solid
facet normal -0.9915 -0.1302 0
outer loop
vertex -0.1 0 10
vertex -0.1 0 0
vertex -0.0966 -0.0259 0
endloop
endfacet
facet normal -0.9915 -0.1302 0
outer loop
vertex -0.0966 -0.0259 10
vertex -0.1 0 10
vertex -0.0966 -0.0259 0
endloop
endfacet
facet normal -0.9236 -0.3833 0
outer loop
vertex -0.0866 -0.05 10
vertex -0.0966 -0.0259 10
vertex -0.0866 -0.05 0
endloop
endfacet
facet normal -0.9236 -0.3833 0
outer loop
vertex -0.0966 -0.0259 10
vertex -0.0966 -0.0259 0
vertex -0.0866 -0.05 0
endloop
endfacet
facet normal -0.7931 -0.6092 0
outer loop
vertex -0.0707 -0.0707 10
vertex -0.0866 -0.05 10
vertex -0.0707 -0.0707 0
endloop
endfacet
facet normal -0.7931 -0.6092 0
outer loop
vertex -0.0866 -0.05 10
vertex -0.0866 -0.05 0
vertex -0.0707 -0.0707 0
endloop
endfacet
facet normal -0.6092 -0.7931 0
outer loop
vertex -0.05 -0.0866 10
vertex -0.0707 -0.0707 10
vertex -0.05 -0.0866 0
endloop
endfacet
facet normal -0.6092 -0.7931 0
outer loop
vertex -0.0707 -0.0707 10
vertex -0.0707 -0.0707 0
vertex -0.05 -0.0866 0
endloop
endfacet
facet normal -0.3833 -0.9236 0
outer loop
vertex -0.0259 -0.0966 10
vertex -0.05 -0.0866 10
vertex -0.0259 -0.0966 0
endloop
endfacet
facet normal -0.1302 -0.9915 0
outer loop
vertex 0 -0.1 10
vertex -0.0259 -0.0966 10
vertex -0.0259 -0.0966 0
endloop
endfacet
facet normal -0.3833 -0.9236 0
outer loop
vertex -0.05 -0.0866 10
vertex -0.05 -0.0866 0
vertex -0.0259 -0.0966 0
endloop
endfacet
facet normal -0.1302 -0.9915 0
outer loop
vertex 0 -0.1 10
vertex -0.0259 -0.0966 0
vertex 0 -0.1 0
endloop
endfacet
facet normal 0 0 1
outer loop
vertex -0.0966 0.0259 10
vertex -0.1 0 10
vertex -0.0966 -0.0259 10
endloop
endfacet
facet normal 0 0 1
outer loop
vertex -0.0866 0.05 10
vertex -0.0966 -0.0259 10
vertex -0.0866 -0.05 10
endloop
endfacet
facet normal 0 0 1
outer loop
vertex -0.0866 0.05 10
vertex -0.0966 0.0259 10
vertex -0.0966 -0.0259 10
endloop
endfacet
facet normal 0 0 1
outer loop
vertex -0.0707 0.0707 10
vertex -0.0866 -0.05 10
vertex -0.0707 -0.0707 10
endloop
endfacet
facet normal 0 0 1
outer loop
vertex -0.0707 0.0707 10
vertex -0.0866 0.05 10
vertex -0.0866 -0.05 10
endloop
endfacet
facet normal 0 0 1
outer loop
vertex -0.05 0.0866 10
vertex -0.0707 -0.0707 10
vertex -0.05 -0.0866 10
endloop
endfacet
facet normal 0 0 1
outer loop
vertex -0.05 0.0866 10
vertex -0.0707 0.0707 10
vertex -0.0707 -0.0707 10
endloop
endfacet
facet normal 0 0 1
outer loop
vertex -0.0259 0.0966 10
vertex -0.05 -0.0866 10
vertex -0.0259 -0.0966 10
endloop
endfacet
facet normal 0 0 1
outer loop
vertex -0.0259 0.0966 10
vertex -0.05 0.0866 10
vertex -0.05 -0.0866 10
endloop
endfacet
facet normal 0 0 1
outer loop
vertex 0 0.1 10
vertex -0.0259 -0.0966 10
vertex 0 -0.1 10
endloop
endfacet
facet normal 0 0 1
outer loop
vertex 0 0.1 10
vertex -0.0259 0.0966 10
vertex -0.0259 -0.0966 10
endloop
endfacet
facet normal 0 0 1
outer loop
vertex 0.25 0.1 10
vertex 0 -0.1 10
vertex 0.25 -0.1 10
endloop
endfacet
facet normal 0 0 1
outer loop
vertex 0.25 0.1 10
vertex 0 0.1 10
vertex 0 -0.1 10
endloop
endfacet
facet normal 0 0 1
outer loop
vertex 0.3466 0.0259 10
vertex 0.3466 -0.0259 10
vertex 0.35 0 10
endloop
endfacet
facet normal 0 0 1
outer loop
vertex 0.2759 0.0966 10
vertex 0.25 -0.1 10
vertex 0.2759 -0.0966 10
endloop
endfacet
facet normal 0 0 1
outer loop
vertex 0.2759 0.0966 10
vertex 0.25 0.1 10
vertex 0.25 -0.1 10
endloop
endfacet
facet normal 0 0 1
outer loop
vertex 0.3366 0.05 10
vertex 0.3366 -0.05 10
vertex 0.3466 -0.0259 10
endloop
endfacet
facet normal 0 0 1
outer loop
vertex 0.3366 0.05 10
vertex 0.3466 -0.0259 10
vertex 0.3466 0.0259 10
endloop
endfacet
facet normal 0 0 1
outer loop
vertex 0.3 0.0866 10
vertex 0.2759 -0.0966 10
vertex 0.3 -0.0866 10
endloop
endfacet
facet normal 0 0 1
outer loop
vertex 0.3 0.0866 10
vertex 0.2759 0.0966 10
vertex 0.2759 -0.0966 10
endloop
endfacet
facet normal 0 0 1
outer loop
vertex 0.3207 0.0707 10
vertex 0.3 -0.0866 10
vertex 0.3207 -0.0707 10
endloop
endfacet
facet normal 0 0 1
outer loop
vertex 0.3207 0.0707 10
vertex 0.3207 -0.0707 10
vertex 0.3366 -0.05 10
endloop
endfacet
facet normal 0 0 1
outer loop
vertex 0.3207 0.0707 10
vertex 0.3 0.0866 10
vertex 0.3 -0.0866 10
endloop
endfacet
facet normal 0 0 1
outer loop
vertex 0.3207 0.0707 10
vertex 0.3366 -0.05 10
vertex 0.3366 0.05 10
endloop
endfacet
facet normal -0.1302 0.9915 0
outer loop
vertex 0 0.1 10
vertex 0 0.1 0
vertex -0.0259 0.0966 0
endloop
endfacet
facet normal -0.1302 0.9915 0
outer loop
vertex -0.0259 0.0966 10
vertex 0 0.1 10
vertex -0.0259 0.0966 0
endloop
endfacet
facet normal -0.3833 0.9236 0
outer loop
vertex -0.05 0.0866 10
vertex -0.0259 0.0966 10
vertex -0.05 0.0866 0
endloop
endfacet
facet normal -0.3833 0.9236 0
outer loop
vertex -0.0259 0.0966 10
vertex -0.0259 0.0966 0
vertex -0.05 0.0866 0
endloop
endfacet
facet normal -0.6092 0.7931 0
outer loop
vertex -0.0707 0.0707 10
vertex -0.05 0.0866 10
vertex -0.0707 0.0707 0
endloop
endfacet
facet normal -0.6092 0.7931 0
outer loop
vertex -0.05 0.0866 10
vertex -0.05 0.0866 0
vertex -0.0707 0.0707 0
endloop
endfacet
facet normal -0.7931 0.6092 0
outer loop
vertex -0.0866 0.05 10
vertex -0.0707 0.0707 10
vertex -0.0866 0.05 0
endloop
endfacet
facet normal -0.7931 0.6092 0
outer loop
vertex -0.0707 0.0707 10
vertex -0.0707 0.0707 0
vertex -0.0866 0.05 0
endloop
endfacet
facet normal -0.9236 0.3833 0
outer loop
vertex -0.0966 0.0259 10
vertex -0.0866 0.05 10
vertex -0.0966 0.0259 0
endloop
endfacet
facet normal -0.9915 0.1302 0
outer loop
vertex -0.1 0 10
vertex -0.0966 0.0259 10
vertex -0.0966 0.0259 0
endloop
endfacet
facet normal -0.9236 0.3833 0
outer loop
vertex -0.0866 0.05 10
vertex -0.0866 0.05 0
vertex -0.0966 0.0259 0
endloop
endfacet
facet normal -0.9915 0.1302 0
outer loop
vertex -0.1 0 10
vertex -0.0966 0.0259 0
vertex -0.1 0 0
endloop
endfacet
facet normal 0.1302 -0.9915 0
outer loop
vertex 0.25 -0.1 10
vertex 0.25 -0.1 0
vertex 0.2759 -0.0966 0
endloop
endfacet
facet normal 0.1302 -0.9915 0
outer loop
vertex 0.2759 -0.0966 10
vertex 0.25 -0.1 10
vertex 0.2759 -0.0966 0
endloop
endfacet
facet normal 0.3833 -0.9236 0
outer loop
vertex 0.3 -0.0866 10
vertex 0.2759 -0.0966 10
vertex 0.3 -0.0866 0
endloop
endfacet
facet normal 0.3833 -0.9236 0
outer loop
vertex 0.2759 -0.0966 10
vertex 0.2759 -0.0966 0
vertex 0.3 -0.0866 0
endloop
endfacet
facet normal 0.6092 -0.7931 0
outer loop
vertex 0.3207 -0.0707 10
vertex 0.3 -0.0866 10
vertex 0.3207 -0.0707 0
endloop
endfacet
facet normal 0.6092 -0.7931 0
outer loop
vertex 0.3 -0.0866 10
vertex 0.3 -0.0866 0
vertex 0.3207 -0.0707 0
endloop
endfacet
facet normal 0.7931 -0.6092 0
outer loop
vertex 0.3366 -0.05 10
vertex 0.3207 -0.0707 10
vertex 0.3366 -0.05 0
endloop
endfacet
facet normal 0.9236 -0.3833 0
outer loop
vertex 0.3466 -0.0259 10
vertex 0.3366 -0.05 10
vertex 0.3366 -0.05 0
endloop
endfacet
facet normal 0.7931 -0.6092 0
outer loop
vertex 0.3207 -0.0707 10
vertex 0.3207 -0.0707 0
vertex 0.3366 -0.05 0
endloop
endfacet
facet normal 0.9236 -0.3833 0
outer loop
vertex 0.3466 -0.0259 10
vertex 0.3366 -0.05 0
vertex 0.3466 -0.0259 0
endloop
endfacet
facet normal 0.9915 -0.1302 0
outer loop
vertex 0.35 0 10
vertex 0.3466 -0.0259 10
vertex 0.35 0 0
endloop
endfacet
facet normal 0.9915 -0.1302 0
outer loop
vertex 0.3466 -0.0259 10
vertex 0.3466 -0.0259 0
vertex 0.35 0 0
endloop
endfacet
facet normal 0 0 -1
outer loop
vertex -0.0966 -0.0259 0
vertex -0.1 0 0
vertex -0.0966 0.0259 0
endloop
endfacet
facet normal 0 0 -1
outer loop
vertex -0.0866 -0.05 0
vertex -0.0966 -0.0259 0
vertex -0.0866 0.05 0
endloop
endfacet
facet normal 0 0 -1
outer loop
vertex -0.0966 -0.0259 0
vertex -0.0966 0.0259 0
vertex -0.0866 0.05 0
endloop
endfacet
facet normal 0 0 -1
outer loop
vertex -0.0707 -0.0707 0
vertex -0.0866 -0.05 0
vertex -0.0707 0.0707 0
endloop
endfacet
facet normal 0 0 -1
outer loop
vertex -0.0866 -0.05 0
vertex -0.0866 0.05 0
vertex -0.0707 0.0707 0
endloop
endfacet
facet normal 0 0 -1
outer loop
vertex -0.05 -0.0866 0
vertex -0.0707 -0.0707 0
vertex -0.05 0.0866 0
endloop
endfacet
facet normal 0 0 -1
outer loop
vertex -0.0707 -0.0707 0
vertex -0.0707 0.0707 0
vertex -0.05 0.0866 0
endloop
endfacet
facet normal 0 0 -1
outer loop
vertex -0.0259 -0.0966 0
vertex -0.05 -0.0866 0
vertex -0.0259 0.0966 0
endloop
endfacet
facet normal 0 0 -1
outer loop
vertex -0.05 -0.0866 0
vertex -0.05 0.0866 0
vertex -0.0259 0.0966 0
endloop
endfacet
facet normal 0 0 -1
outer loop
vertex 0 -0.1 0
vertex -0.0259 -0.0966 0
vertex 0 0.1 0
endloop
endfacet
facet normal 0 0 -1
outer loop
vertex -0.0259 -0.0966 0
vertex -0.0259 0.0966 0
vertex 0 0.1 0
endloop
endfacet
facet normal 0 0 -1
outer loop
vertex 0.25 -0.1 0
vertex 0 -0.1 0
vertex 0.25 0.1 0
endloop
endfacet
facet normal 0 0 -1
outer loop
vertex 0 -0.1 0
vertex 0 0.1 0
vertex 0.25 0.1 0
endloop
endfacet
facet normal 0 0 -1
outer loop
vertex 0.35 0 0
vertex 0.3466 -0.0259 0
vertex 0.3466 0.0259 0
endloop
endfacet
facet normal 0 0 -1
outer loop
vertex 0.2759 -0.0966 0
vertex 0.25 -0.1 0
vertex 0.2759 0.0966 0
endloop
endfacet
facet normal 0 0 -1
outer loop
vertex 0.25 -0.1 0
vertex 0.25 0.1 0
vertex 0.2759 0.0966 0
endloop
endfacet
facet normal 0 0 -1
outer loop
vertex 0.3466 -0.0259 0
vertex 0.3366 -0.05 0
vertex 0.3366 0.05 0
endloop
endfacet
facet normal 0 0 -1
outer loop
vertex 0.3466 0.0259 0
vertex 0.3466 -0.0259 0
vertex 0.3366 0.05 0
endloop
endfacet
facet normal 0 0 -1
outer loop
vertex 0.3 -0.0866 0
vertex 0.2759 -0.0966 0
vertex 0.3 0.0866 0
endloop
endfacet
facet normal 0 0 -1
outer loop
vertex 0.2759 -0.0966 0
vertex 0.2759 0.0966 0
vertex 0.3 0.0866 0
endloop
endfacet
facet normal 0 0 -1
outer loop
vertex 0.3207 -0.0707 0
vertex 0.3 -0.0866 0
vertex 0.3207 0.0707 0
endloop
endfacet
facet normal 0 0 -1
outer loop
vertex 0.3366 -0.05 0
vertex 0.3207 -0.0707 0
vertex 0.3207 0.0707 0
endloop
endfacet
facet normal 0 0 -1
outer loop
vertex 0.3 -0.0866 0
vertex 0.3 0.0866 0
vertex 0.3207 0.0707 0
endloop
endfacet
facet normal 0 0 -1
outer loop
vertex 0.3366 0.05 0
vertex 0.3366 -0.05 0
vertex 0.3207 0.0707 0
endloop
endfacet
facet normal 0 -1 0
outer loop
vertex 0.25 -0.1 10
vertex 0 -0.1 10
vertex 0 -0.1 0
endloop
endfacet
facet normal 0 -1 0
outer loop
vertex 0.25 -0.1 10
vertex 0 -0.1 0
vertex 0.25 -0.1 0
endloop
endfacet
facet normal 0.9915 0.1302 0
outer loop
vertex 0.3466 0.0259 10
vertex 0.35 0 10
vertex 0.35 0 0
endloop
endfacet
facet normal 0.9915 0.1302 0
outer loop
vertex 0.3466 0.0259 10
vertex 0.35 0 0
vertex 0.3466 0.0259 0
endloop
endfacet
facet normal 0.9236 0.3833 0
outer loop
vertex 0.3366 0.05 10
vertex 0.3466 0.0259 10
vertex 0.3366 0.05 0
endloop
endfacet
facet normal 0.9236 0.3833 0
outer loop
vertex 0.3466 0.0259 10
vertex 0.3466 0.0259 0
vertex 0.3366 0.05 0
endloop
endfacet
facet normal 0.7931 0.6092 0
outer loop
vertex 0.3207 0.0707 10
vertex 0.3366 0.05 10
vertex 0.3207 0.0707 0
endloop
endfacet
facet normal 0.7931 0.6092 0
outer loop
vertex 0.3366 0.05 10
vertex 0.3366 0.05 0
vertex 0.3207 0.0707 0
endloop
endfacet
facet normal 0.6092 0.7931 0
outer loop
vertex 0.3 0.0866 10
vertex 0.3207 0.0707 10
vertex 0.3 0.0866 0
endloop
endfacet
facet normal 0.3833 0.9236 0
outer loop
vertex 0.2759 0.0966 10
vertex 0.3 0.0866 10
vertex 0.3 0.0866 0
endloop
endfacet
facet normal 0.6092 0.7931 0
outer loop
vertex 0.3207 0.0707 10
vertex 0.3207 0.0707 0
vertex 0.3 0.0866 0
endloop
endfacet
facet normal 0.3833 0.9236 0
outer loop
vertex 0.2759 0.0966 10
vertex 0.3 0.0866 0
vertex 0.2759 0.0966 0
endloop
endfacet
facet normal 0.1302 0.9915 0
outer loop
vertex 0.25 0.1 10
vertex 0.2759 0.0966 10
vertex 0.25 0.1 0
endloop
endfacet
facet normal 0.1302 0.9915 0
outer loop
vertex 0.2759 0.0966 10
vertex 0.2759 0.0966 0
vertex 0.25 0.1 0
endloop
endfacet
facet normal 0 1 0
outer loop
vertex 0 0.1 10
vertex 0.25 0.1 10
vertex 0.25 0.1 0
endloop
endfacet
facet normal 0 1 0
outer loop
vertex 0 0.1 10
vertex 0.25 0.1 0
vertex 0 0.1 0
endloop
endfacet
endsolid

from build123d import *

# Parameters (mm, degrees)
DODANIE_WYCI_GNI_CIE1_DEPTH = 10


with BuildPart() as part:
    # Szkic1 → Dodanie-wyciągnięcie1 (new body)
    with BuildSketch(Plane.XY):
        with BuildLine():
            Line((0.25, 0.1), (0.125, 0.1))
            Line((0.125, 0.1), (0.125, 0))
            Line((0.125, 0), (0.35, 0))
            ThreePointArc((0.35, 0), (0.320710678, 0.070710678), (0.25, 0.1))
        make_face()
        with BuildLine():
            Line((0.35, 0), (0.125, 0))
            Line((0.125, 0), (0.125, -0.1))
            Line((0.125, -0.1), (0.25, -0.1))
            ThreePointArc((0.25, -0.1), (0.320710678, -0.070710678), (0.35, 0))
        make_face()
        with BuildLine():
            Line((0.125, 0.1), (0, 0.1))
            ThreePointArc((0, 0.1), (-0.070710678, 0.070710678), (-0.1, 0))
            Line((-0.1, 0), (0.125, 0))
            Line((0.125, 0), (0.125, 0.1))
        make_face()
        with BuildLine():
            Line((0.125, 0), (-0.1, 0))
            ThreePointArc((-0.1, 0), (-0.070710678, -0.070710678), (0, -0.1))
            Line((0, -0.1), (0.125, -0.1))
            Line((0.125, -0.1), (0.125, 0))
        make_face()
    extrude(amount=DODANIE_WYCI_GNI_CIE1_DEPTH)


solid = part.part
